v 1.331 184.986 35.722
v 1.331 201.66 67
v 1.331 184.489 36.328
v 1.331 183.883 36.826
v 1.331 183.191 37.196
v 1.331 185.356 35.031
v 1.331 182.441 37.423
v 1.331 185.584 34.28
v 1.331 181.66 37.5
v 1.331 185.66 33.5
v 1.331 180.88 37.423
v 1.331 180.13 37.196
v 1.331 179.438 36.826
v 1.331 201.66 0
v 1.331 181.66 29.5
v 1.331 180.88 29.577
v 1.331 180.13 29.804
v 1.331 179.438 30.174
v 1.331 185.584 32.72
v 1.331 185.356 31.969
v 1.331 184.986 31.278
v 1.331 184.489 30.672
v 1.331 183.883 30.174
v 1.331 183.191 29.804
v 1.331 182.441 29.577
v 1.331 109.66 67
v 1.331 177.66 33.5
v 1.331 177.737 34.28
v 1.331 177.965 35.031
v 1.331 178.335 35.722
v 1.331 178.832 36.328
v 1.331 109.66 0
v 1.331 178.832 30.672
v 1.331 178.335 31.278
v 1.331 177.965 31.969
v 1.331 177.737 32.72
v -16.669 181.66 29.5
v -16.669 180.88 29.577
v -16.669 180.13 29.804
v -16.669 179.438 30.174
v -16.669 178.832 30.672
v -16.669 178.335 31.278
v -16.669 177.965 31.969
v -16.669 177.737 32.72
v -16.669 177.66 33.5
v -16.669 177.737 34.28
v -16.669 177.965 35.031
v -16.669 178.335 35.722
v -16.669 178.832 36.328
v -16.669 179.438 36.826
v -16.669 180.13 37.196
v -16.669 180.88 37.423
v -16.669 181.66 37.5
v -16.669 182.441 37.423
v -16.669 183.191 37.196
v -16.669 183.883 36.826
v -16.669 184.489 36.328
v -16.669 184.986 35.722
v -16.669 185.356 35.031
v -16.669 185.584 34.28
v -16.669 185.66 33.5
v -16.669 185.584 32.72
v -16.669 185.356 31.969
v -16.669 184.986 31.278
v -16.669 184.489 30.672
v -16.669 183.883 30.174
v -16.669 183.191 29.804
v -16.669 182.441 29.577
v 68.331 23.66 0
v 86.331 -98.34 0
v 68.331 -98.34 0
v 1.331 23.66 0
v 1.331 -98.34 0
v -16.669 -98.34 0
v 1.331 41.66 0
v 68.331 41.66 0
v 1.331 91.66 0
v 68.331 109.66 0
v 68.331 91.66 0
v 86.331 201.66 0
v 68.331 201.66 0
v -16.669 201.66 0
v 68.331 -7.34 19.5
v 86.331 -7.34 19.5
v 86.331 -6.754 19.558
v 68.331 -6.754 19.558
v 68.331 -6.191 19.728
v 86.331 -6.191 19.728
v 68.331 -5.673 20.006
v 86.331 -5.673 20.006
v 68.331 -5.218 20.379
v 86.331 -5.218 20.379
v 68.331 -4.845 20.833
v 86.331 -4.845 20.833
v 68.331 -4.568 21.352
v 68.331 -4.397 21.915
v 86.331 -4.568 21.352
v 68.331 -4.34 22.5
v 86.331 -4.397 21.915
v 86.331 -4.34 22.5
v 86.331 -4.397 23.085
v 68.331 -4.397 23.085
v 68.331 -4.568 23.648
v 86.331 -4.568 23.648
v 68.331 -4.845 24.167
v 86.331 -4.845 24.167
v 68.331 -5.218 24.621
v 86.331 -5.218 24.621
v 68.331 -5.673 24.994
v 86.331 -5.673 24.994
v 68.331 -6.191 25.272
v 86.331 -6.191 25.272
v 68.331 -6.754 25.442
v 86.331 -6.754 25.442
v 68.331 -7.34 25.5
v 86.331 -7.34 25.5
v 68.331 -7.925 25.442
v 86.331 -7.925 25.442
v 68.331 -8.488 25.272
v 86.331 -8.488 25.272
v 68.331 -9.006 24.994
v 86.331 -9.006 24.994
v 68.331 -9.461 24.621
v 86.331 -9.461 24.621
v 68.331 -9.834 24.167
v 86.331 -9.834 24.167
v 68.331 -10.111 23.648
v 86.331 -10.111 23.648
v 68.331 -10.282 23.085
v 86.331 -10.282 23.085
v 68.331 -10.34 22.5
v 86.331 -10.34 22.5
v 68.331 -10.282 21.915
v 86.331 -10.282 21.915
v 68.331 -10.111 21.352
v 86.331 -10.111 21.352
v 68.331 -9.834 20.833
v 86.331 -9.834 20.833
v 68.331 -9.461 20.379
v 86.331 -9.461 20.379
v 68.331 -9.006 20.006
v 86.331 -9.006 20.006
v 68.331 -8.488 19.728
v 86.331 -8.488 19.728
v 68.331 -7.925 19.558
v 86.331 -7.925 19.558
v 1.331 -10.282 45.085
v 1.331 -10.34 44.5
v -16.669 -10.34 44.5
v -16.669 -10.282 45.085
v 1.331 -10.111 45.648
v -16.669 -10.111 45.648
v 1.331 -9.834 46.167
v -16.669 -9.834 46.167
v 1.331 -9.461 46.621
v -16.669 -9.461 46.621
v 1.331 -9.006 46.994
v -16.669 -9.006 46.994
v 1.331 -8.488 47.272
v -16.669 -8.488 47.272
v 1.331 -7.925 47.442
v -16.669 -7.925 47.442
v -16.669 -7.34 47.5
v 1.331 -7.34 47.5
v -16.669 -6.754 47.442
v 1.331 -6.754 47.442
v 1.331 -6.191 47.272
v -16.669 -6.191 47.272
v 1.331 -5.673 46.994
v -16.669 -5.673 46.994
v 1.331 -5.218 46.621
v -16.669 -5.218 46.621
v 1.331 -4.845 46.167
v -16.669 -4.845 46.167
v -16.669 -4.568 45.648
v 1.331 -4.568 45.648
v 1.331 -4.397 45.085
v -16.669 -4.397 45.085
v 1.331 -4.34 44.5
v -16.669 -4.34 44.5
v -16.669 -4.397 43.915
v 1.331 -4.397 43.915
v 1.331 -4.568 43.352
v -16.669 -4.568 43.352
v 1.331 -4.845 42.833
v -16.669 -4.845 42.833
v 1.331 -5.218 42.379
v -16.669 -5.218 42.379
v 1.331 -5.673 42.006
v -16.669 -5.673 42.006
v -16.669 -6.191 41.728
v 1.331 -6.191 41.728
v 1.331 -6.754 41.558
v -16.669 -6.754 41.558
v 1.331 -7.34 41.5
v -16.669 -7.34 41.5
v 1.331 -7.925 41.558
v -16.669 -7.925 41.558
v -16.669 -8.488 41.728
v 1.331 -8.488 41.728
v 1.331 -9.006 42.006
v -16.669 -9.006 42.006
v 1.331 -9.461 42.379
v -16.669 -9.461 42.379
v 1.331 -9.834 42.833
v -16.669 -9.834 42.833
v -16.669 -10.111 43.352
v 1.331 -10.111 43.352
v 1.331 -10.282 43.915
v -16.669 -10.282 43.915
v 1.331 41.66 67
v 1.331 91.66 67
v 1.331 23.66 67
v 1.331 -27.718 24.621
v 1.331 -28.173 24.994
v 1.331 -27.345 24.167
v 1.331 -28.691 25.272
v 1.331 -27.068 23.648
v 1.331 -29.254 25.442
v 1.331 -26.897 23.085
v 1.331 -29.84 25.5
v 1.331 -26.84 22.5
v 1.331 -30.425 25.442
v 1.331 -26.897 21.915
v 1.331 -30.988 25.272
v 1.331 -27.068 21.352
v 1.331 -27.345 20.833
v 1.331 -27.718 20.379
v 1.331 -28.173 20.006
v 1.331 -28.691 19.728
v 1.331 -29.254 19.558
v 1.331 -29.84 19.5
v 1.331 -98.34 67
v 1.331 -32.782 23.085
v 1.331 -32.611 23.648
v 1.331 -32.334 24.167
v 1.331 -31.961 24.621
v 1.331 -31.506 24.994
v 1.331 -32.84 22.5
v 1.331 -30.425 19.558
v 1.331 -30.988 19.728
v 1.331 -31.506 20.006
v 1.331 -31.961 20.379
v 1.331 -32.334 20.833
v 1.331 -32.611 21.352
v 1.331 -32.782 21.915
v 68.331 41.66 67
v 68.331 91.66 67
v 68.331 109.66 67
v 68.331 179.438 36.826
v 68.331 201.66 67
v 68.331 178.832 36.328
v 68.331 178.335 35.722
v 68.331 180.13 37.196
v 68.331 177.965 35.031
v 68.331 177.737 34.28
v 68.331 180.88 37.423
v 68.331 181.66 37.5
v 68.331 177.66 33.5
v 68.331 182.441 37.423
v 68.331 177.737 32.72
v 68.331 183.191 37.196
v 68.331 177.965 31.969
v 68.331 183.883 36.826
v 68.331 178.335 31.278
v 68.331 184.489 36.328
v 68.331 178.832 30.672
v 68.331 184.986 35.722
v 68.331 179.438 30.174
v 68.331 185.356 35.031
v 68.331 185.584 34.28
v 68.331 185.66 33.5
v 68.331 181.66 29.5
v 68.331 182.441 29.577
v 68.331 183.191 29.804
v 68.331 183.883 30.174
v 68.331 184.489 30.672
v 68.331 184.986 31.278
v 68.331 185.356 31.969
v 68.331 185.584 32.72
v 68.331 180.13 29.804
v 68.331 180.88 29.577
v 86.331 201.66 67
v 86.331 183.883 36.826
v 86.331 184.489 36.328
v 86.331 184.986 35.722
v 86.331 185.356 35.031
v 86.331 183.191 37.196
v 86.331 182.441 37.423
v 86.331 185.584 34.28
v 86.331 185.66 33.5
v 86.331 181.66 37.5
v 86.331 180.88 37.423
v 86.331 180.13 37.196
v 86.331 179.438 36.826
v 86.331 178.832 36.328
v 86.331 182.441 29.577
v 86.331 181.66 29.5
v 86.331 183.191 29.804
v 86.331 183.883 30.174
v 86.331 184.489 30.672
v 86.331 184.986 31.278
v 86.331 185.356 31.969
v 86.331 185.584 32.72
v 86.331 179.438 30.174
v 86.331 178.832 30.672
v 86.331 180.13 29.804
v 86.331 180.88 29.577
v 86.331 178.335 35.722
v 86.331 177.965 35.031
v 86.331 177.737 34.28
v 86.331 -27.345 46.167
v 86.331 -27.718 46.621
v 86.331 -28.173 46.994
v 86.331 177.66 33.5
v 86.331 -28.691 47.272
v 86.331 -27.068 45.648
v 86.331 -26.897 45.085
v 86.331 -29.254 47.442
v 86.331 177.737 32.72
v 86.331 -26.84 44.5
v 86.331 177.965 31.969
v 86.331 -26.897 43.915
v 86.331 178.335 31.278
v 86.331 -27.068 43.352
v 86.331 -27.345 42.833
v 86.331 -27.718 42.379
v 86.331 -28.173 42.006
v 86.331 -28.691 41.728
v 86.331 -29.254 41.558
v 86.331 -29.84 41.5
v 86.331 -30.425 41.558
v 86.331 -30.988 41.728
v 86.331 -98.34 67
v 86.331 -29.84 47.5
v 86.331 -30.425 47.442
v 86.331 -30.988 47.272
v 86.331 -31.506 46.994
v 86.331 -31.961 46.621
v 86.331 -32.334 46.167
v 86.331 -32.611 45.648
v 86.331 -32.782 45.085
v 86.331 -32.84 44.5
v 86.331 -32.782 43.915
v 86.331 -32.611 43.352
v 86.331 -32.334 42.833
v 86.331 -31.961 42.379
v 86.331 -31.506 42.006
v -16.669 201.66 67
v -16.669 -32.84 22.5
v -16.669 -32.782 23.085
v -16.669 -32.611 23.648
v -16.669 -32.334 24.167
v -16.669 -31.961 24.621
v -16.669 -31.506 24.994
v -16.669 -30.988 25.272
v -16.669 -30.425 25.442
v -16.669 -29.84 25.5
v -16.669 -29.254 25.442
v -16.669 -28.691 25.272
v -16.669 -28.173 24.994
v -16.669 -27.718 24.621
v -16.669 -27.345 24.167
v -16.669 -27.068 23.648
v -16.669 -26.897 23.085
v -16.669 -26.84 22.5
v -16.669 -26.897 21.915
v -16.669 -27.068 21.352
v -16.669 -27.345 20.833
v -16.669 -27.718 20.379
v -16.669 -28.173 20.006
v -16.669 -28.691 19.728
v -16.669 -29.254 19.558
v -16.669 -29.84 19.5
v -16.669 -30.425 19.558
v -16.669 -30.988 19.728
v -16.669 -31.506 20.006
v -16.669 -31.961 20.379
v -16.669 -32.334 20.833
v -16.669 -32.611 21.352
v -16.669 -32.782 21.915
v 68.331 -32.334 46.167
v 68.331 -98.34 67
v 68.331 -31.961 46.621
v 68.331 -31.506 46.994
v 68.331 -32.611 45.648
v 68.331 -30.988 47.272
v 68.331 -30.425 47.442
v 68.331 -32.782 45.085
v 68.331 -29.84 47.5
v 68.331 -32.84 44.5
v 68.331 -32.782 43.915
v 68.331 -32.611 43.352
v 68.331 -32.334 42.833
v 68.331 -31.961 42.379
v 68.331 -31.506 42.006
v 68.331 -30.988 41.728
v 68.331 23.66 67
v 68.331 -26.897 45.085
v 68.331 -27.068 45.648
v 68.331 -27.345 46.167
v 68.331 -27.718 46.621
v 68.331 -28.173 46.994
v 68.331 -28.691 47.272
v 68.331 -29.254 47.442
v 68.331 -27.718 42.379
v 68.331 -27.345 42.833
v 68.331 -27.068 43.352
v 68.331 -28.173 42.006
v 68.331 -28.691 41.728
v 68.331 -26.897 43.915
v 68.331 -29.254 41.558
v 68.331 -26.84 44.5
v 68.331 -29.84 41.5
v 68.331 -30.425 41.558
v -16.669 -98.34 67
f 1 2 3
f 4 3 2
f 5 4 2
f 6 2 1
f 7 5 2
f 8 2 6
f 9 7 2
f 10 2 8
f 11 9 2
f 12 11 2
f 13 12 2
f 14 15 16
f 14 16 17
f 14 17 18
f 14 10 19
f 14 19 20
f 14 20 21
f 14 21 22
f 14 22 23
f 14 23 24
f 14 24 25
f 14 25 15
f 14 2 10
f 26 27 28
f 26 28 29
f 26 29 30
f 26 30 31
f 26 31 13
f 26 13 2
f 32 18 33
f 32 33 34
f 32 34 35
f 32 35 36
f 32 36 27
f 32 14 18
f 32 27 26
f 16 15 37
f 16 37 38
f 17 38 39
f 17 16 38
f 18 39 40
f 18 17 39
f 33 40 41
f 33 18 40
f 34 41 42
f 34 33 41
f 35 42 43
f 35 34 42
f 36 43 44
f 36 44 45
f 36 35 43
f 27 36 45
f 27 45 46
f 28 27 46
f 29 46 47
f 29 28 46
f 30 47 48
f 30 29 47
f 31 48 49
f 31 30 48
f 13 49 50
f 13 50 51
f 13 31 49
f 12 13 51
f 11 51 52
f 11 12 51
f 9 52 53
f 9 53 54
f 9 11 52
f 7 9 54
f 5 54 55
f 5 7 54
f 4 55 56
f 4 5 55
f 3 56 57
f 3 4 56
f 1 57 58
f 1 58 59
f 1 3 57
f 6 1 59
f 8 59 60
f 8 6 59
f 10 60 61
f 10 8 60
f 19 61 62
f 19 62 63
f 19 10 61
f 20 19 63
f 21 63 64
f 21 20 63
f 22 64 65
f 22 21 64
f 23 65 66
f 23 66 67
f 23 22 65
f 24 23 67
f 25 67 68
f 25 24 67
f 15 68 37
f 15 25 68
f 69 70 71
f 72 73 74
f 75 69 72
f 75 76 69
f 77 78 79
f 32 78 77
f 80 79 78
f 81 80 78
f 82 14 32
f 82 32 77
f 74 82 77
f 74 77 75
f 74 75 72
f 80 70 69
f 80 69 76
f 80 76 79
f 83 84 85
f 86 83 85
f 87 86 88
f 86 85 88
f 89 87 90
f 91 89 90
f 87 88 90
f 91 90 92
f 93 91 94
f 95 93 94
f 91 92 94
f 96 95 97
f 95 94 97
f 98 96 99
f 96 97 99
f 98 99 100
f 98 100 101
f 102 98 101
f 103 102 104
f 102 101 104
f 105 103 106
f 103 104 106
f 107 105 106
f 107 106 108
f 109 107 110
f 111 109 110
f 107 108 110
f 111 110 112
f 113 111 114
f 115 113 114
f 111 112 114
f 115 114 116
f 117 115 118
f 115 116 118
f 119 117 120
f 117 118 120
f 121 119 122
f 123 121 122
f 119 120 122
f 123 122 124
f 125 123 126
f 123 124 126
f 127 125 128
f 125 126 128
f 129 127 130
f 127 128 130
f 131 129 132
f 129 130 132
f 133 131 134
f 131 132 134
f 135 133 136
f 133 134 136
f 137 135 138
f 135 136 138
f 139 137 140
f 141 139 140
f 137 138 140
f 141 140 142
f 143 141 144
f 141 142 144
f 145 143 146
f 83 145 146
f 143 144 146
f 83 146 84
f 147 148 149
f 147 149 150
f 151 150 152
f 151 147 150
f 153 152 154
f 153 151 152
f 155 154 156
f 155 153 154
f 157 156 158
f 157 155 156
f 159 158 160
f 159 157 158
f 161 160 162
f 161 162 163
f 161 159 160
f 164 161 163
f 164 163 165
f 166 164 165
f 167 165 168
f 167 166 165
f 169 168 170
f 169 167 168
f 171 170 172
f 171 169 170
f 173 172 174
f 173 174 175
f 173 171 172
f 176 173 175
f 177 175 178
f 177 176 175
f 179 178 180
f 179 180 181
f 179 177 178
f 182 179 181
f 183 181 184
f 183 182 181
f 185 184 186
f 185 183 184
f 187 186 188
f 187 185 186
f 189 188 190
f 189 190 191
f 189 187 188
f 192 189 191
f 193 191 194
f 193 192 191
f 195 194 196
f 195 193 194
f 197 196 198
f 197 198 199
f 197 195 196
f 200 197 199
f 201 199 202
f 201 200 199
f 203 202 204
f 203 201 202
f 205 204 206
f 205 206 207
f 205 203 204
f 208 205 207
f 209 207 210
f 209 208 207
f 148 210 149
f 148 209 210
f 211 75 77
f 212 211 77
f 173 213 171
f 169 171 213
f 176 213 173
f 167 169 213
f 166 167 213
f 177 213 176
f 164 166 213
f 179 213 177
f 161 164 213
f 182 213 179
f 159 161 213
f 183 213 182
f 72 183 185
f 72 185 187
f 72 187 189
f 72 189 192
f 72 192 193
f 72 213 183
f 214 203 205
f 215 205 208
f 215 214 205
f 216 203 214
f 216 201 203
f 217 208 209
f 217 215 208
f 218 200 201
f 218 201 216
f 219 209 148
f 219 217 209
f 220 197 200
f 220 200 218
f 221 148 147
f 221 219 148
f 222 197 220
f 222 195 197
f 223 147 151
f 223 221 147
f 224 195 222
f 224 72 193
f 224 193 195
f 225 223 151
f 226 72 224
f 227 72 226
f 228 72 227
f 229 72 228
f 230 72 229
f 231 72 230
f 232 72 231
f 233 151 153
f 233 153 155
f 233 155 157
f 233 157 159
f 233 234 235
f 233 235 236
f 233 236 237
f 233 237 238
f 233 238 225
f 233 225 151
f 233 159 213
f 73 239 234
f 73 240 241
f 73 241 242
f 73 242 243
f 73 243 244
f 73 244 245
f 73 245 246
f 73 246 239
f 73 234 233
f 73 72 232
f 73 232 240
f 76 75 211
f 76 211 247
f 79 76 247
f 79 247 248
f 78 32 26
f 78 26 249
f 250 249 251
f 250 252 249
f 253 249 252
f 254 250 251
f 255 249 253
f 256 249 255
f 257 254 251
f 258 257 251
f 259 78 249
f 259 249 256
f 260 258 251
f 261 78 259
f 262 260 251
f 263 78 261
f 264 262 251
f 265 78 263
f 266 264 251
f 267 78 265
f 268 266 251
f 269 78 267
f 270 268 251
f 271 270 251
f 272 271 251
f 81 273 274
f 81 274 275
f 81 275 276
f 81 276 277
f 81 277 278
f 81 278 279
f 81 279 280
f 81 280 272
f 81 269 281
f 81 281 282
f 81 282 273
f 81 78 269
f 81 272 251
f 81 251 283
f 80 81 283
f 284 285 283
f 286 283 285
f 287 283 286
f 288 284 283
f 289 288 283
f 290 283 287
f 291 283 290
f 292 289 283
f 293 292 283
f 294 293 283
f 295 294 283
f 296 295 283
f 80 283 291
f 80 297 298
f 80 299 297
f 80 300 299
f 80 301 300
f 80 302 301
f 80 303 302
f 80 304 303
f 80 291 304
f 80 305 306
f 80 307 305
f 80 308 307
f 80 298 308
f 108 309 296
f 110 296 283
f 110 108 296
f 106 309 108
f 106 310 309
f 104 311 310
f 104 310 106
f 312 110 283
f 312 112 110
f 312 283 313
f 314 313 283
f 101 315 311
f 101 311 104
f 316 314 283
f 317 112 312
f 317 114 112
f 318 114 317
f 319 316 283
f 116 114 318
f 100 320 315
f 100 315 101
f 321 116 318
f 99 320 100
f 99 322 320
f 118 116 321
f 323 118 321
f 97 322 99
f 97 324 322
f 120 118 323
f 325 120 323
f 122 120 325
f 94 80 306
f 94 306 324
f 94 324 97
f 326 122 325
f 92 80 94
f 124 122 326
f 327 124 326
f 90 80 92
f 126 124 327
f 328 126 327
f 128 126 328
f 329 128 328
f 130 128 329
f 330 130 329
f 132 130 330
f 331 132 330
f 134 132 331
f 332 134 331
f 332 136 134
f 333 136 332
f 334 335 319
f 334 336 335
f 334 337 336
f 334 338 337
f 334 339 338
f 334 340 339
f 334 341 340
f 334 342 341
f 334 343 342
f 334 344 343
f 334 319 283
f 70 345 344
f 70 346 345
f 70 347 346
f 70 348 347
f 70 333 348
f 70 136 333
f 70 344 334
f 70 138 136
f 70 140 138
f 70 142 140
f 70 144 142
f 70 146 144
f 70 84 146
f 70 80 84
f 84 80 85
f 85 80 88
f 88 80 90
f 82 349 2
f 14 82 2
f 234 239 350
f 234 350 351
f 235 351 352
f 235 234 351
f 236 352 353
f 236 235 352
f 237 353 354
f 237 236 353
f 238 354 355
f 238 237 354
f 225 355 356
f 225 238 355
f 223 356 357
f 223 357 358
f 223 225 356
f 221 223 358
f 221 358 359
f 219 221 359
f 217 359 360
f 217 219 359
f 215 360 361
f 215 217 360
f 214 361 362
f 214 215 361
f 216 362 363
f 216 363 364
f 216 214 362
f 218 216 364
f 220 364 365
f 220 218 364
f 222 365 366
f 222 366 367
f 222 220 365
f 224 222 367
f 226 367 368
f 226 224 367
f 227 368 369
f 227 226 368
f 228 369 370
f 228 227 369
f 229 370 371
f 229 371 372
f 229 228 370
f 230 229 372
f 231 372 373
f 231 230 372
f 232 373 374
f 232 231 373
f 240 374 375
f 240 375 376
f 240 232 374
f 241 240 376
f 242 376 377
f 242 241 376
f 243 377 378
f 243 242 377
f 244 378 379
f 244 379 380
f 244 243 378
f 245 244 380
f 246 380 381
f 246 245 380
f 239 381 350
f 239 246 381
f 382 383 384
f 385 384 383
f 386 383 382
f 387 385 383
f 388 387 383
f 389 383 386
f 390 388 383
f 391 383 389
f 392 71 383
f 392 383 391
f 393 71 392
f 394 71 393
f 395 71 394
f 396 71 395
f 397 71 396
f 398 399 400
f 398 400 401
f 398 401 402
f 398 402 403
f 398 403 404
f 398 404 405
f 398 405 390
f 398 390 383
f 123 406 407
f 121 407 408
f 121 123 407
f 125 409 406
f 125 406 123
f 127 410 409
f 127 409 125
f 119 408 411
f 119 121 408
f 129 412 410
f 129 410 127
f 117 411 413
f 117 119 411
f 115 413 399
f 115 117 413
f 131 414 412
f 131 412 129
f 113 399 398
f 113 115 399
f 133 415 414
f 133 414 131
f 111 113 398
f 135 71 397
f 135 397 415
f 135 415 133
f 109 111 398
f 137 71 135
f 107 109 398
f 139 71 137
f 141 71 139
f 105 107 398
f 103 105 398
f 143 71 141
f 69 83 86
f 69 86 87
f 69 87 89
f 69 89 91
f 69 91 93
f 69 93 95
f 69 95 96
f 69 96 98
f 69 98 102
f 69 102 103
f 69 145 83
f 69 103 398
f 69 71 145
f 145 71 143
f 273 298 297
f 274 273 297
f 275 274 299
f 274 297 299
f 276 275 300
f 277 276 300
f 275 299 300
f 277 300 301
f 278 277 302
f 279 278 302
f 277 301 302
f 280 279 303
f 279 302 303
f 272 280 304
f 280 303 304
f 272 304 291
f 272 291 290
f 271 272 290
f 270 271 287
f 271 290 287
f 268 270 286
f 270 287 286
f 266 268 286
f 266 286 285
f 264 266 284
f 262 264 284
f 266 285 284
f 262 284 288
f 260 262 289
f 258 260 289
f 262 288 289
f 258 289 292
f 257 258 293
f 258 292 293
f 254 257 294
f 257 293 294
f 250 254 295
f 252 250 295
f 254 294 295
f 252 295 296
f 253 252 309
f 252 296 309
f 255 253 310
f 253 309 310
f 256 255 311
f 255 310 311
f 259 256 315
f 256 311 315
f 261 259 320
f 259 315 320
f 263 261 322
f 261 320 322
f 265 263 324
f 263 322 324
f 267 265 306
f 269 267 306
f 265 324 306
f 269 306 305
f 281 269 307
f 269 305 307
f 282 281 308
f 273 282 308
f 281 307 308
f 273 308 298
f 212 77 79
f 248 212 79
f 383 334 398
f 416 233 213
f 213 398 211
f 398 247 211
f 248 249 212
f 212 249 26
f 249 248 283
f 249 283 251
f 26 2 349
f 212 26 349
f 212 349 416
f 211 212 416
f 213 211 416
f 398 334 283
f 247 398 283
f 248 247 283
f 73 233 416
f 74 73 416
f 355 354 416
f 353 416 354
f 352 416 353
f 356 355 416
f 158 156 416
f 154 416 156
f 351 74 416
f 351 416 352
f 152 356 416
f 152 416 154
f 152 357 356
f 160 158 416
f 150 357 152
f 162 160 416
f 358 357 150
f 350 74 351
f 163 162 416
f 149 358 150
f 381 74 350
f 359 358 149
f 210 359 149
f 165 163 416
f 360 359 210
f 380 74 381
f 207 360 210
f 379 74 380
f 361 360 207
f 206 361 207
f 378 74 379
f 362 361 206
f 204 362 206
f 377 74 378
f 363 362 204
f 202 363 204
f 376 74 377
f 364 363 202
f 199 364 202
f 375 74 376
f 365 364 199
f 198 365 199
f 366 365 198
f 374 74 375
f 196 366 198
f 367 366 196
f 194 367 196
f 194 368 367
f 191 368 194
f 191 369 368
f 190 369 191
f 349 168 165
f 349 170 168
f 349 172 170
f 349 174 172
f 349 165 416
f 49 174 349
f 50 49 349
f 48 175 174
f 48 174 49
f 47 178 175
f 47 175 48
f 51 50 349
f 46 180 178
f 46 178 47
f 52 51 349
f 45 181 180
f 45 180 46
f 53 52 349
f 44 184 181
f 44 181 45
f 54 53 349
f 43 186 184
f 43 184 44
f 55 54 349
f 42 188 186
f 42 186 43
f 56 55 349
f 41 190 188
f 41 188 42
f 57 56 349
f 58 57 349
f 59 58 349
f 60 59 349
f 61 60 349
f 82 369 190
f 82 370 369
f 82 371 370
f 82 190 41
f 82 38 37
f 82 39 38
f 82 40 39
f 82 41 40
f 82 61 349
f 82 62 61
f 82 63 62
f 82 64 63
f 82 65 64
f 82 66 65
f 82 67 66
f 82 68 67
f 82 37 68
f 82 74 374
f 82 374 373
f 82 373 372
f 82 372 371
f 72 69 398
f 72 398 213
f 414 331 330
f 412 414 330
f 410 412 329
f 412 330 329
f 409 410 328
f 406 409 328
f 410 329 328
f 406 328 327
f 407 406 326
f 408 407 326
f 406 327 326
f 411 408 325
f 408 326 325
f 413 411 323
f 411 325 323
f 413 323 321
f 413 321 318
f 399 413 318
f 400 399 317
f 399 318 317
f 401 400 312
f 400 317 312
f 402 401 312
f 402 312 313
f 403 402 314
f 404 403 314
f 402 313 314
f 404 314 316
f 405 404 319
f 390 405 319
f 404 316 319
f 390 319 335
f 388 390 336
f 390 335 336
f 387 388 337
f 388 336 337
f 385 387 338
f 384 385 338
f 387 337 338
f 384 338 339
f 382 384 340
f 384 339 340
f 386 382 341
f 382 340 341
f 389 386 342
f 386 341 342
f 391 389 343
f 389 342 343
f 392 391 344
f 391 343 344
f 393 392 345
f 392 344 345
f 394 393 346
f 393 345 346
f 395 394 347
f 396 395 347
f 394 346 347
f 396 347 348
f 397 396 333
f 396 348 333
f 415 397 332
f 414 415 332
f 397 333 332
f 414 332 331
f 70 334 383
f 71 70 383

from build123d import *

# Parameters (mm, degrees)
SKETCH1_W           = 67
SKETCH1_H           = 50
BOSS_EXTRUDE3_DEPTH = 67
SKETCH2_R           = 3
SKETCH2_R_2         = 4
CUT_EXTRUDE1_DEPTH  = 18
CUT_EXTRUDE2_START  = -18
SKETCH3_R           = 3
SKETCH3_R_2         = 4
CUT_EXTRUDE2_DEPTH  = 18


with BuildPart() as part:
    # Sketch1 → Boss-Extrude3 (new body)
    with BuildSketch(Plane.XY):
        Polygon((1.330634734, 23.660498279), (1.330634734, -98.339501721), (-16.669365266, -98.339501721), (-16.669365266, 201.660498279), (1.330634734, 201.660498279), (1.330634734, 109.660498279), (68.330634734, 109.660498279), (68.330634734, 201.660498279), (86.330634734, 201.660498279), (86.330634734, -98.339501721), (68.330634734, -98.339501721), (68.330634734, 23.660498279), align=None)
        with Locations((34.830634734, 66.660498279)):
            Rectangle(SKETCH1_W, SKETCH1_H, mode=Mode.SUBTRACT)
    extrude(amount=BOSS_EXTRUDE3_DEPTH)

    # Sketch2 → Cut-Extrude1 (cut)
    with BuildSketch(Plane(origin=(86.330634734, 0, 0), x_dir=(0, 0, -1), z_dir=(1, 0, 0))):
        with Locations((-44.5, -29.839501721)):
            Circle(SKETCH2_R)
        with Locations((-22.5, -7.339501721)):
            Circle(SKETCH2_R)
        with Locations((-33.5, 181.660498279)):
            Circle(SKETCH2_R_2)
    extrude(amount=-CUT_EXTRUDE1_DEPTH, mode=Mode.SUBTRACT)

    # Sketch3 → Cut-Extrude2 (cut)
    with BuildSketch(Plane.ZY.offset(16.669365266).offset(CUT_EXTRUDE2_START)):
        with Locations(Location((22.5, -29.839501721, 0), (0, 0, 270))):
            Circle(SKETCH3_R)
        with Locations(Location((44.5, -7.339501721, 0), (0, 0, 270))):
            Circle(SKETCH3_R)
        with Locations(Location((33.5, 181.660498279, 0), (0, 0, 180))):
            Circle(SKETCH3_R_2)
    extrude(amount=CUT_EXTRUDE2_DEPTH, mode=Mode.SUBTRACT)


solid = part.part
